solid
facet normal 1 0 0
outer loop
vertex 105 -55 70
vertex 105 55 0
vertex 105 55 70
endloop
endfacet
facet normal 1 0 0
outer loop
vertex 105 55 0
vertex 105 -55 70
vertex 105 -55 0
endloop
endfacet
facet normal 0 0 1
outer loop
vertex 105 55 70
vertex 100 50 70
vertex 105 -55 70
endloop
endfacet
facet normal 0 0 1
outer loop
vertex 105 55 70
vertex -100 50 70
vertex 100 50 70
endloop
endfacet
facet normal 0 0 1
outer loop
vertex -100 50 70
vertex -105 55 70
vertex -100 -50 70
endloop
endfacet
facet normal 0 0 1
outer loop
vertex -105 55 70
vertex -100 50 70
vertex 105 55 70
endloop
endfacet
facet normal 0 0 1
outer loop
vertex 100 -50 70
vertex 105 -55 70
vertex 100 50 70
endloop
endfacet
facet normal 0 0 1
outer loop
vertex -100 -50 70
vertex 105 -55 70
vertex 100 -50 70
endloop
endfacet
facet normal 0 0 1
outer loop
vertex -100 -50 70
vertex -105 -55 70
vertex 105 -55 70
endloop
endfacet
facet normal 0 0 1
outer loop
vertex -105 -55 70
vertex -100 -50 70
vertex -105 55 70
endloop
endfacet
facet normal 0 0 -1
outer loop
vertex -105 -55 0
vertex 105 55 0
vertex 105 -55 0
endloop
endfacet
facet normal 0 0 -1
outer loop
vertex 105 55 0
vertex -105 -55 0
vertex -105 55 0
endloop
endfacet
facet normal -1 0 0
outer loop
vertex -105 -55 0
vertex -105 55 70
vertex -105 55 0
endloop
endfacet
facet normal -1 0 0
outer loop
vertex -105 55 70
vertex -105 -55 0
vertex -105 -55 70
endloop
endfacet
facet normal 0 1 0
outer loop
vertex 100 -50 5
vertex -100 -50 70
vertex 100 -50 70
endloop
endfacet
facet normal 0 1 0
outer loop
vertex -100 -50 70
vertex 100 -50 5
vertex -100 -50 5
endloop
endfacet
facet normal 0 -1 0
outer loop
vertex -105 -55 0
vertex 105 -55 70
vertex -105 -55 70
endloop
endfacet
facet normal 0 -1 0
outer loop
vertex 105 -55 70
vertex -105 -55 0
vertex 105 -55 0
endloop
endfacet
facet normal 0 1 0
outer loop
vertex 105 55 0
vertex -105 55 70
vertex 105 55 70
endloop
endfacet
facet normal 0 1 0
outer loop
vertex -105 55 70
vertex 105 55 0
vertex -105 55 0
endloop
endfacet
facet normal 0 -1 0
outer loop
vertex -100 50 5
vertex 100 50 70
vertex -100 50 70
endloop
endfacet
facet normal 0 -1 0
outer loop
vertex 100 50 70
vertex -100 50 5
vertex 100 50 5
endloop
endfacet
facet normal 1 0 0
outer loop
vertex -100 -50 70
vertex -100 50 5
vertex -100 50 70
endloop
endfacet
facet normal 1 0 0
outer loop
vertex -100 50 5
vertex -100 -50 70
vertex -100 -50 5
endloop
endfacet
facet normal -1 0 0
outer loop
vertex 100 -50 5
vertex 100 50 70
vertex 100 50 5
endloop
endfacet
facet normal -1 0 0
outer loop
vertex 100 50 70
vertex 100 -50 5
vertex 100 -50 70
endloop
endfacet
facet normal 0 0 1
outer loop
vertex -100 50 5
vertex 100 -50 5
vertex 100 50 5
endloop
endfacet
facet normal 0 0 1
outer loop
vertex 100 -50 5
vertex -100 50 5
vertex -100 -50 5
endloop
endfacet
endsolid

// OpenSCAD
/*
Parametric box

Description: Print a box to hold a given number of items of a specified size.

Configuration:
- Uncomment one of the "Size configuration" sections.
- Set the items variable to the desired amount.
- Set wall_thickness if you want to.
- Check the size of the resulting model before printing!

Git repository: http://github.com/romeokoati/parametric-box

Thingiverse: http://www.thingiverse.com/thing:4448

Copyright (C) 2022 KOATI NEMALEU ROMEO

This program is free software: you can redistribute it and/or modify it under the terms of the GNU General Public License as published by the Free Software Foundation, either version 3 of the License, or (at your option) any later version.

This program is distributed in the hope that it will be useful, but WITHOUT ANY WARRANTY; without even the implied warranty of MERCHANTABILITY or FITNESS FOR A PARTICULAR PURPOSE.  See the GNU General Public License for more details.

You should have received a copy of the GNU General Public License along with this program.  If not, see <http://www.gnu.org/licenses/>.
*/

/*
Size configuration
Uncomment one of the sections below or set your own
The sizes are as seen from the "front", i.e., the cover of a book or CD.
*/

// Default size in case of no configuration
item_width = 65;
item_height = 100;
item_depth = 25;

/*
// Jewel case <http://en.wikipedia.org/wiki/Optical_disc_packaging#Jewelry_case>, the common size for CDs:
item_width = 142;
item_height = 125;
item_depth = 10;
*/

/*
// Slimline jewel case <http://en.wikipedia.org/wiki/Optical_disc_packaging#Slimline_jewel_case>, used for CD singles:
item_width = 142;
item_height = 125;
item_depth = 7;
*/

/*
// Keep case <http://en.wikipedia.org/wiki/Keep_case>, used for DVDs:
item_width = 135;
item_height = 190;
item_depth = 15;
*/

// Items configuration
// Set how many items you want to be able to fit inside the box.
items = 8;

// Wall configuration
// Set how thick you want the wall (depends too much on aesthetics to auto-generate).
wall_thickness = 5;

module debug_item() {
    cube(size = [item_depth, item_height, item_width]);
}

module debug_items() {
    translate([-exterior_x / 2, -exterior_y / 2, 0]) {
        for( index = [0:items - 1] ) {
            translate ([index * item_depth + wall_thickness, wall_thickness, wall_thickness]) {
                debug_item();
            }
        }
    }
}

// Uncomment this if you want to see the items themselves
//# debug_items();


interior_x = items * item_depth;
interior_y = item_height;
interior_z = item_width;

exterior_x = interior_x + 2 * wall_thickness;
exterior_y = interior_y + 2 * wall_thickness;
exterior_z = interior_z + wall_thickness; // Smaller because of the opening

module top_bottom_plate() {
    cube(size = [exterior_x, wall_thickness, exterior_z]);    
}

module top_bottom() {
    union() {
        top_bottom_plate();
        translate([0, interior_y + wall_thickness, 0]) {
            top_bottom_plate();
        }
    }
}

module left_right_plate() {
    cube(size = [wall_thickness, exterior_y, exterior_z]);        
}

module left_right() {
    union() {
        left_right_plate();
        translate([interior_x + wall_thickness, 0, 0]) {
            left_right_plate();
        }
    }    
}

module back() {
    cube(size = [exterior_x, exterior_y, wall_thickness]);
}

module box() {
    translate([-exterior_x / 2, -exterior_y / 2, 0]) {
        union() {
            top_bottom();
            left_right();
            back();
        }
    }
}

box();
